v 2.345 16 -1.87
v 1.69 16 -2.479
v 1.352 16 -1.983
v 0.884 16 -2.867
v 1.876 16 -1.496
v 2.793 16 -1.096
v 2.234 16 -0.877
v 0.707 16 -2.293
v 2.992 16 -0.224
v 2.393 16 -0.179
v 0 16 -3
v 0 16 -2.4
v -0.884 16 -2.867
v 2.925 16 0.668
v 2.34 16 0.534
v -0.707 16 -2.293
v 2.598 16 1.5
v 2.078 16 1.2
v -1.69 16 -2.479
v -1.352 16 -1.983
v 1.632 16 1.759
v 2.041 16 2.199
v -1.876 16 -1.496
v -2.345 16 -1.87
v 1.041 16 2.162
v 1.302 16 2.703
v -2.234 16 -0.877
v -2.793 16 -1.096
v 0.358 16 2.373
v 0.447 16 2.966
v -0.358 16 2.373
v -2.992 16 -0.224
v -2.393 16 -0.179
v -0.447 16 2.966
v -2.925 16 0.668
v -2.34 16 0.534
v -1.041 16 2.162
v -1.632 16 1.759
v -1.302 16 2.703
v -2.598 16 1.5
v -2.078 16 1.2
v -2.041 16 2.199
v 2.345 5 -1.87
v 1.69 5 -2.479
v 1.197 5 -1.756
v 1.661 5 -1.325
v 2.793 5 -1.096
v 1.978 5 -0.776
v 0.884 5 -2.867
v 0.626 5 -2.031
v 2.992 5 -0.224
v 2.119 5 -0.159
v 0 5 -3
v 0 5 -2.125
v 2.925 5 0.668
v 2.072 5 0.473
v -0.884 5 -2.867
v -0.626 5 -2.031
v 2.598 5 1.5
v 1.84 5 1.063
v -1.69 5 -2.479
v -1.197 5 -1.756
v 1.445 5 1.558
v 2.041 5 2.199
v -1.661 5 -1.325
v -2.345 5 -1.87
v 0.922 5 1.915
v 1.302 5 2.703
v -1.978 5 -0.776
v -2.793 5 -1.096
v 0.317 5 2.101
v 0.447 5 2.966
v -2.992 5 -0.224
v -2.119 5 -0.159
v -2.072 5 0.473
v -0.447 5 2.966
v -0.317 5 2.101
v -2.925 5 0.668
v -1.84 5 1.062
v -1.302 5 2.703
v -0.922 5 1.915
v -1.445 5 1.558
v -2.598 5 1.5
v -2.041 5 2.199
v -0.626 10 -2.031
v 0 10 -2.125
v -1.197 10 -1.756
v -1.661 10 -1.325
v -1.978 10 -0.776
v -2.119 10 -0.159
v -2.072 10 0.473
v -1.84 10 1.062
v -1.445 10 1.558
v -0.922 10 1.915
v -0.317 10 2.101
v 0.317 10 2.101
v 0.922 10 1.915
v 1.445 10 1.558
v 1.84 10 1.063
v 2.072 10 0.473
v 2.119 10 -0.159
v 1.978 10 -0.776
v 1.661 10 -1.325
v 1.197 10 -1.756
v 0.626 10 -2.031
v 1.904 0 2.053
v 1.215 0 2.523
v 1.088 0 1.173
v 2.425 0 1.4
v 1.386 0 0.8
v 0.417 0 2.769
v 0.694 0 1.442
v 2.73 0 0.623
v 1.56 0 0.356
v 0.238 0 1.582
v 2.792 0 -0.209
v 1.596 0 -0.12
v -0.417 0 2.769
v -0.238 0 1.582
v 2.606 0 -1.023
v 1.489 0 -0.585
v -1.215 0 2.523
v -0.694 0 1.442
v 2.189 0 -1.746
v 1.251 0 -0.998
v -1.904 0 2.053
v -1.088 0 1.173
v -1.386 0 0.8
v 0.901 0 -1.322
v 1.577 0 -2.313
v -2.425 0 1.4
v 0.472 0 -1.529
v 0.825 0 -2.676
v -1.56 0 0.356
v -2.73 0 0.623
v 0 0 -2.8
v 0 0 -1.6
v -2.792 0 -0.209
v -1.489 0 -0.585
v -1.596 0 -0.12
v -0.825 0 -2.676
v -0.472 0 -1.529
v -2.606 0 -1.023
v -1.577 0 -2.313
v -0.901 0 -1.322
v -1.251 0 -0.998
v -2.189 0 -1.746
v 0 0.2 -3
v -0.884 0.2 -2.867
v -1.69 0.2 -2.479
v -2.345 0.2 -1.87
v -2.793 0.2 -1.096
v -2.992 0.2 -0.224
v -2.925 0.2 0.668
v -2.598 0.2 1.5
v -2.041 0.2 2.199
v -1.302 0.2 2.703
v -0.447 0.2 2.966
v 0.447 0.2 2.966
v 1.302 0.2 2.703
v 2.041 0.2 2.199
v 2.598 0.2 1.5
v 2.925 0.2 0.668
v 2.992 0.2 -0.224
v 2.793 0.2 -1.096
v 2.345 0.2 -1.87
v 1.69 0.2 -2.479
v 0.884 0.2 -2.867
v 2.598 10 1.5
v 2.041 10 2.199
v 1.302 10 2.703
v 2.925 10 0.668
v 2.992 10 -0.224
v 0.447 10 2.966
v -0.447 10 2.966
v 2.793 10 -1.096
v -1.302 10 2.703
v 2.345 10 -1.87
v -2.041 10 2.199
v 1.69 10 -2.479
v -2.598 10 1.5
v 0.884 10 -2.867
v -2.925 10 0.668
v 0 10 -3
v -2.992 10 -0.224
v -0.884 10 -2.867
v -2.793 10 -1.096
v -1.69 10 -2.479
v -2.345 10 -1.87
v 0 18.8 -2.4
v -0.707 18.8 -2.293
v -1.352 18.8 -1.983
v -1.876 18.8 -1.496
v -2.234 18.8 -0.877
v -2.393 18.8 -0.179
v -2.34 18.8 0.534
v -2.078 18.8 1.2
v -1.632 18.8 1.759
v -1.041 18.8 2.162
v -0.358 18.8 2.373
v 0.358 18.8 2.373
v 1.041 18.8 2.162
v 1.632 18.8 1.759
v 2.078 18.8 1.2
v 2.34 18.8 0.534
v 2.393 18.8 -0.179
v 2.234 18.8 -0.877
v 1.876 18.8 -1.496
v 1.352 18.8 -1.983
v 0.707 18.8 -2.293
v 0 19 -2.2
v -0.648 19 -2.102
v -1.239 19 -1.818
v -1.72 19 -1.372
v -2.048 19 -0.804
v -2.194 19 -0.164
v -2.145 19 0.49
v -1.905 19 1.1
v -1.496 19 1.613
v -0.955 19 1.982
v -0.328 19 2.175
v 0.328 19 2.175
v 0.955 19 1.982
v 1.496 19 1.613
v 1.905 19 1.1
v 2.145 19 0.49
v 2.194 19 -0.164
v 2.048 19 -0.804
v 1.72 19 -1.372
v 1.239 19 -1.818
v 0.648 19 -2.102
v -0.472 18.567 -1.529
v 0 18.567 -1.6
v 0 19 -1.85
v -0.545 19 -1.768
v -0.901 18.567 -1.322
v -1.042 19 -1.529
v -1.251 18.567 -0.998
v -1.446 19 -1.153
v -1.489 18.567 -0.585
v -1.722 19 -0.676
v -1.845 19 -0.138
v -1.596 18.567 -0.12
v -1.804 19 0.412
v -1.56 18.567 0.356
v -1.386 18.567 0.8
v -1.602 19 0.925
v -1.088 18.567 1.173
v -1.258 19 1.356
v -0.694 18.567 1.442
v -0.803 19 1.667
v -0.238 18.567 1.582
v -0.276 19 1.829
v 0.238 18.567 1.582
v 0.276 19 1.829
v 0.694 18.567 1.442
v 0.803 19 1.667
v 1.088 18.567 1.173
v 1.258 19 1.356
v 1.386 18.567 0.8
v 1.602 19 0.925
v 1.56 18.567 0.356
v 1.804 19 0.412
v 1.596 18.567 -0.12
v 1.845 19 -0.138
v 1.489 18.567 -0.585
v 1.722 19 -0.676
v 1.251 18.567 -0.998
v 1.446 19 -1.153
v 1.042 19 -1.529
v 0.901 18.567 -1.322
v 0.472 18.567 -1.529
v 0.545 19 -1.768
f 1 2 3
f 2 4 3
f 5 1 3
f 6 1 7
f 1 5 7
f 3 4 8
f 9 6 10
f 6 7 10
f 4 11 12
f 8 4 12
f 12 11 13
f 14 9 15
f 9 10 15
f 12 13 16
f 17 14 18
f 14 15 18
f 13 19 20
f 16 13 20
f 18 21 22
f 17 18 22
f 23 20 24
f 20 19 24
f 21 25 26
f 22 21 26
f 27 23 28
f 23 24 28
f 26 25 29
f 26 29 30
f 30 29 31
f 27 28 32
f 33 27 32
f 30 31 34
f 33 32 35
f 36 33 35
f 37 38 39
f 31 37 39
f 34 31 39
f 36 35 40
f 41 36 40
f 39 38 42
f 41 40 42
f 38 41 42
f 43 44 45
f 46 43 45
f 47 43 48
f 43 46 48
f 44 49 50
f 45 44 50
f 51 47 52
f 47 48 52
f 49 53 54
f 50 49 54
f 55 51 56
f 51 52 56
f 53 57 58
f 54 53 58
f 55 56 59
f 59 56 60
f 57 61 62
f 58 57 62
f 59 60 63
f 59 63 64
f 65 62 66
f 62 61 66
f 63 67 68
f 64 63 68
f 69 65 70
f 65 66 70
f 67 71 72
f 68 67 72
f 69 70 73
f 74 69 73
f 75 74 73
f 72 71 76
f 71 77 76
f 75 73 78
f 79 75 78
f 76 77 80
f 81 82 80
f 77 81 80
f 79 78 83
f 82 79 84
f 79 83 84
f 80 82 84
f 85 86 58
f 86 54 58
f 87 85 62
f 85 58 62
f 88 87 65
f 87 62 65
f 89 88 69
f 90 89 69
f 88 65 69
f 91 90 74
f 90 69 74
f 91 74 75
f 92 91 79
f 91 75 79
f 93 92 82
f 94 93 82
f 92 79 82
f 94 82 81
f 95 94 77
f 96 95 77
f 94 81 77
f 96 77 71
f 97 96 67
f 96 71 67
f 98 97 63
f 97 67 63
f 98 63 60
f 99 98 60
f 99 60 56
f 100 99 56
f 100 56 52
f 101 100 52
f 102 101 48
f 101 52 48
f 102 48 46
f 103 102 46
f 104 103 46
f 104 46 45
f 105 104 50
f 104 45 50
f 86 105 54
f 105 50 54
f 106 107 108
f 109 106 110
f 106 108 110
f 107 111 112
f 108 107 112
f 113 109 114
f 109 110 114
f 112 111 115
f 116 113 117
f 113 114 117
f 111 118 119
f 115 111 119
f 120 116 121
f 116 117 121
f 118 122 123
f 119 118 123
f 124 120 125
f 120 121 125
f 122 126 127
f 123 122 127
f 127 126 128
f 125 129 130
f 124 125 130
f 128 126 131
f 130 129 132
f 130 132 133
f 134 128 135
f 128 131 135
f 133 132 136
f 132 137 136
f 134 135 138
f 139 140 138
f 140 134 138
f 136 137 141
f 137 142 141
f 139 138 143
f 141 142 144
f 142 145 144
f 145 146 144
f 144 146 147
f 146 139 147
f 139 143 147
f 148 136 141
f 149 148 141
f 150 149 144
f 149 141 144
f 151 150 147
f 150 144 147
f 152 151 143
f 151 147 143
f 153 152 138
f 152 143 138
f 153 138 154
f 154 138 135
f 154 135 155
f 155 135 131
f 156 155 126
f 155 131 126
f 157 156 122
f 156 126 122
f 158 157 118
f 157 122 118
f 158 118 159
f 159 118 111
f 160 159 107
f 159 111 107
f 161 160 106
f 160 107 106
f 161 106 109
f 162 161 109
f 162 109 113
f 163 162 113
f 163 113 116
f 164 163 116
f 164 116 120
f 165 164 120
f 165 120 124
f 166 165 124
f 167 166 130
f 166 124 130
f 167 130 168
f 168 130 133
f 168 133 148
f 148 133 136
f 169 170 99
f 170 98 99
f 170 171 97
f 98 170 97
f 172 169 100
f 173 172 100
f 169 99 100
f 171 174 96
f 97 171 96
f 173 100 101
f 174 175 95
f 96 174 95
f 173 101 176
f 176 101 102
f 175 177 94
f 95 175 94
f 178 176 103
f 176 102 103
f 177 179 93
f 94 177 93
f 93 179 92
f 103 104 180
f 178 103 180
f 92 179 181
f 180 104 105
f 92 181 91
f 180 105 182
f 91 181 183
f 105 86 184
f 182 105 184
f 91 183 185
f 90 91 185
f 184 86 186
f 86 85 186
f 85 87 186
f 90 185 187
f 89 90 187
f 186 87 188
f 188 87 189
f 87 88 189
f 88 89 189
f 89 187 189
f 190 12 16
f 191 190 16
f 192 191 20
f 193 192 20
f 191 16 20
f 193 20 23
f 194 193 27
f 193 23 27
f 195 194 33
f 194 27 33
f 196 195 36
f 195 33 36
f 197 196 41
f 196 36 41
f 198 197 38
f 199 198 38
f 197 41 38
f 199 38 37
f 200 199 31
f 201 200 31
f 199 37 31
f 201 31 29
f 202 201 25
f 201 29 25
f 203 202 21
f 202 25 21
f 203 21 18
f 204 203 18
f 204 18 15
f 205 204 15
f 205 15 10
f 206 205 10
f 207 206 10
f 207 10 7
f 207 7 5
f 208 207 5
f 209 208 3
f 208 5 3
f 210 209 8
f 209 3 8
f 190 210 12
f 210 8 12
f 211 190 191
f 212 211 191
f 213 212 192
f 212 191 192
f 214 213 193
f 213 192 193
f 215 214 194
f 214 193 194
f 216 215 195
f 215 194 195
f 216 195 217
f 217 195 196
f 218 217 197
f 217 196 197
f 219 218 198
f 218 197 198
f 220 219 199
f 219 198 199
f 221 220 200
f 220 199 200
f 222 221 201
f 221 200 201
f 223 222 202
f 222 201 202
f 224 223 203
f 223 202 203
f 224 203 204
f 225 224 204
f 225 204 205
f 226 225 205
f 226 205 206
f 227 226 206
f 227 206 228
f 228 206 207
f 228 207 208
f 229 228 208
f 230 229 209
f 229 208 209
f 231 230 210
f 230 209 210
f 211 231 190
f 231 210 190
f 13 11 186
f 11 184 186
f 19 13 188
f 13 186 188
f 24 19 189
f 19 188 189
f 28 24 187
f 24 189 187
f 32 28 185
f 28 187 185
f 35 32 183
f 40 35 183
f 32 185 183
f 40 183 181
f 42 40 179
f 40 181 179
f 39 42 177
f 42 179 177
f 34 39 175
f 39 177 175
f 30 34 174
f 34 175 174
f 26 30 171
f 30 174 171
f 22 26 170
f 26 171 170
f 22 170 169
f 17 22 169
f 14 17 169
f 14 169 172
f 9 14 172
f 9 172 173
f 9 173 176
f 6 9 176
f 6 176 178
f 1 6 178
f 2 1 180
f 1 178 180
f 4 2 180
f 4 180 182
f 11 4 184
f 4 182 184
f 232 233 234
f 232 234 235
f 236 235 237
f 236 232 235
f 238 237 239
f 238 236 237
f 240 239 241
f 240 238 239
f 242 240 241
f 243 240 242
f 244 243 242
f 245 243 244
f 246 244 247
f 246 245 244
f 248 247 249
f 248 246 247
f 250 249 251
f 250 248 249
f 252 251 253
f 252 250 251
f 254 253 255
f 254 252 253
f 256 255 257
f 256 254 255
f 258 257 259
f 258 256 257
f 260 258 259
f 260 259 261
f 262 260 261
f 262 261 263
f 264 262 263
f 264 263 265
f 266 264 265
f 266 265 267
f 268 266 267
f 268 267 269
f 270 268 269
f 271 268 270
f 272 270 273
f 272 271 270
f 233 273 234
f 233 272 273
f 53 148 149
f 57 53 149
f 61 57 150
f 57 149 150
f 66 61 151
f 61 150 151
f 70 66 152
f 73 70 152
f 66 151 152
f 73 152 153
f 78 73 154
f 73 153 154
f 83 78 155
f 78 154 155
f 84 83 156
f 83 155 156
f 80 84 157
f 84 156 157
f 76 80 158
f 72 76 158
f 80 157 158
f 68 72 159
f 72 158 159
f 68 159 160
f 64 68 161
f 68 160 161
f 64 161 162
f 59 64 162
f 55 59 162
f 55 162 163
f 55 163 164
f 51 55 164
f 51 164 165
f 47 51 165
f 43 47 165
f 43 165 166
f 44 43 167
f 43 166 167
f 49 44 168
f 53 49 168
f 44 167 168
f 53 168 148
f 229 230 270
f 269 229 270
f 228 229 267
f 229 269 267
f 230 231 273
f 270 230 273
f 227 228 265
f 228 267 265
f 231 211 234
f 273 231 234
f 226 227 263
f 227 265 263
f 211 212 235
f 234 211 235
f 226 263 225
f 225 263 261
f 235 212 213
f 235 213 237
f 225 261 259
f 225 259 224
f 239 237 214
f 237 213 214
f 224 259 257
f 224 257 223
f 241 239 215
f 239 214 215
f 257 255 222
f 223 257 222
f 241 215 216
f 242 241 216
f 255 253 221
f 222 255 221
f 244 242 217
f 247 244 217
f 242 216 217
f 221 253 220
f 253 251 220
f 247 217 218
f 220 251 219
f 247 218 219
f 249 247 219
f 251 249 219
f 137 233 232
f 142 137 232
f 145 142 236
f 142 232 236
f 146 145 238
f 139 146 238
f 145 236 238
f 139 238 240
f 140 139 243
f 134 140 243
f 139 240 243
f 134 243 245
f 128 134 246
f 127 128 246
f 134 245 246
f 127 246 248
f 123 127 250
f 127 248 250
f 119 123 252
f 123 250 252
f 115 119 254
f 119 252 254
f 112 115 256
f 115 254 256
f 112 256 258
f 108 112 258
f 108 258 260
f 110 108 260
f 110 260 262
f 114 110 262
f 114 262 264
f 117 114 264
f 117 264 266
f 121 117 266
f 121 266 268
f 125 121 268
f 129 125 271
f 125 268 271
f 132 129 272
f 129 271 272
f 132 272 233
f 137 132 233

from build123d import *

# Parameters (mm, degrees)
CHAFL_N4_SIZE  = 0.2
CHAFL_N5_SIZE  = 0.25
CHAFL_N5_SIZE2 = 0.433012702


with BuildPart() as part:
    # Croquis3 → Revolución1 (revolve)
    with BuildSketch(Plane.XY, mode=Mode.PRIVATE) as revoluci_n1_sk:
        Polygon((-1.6, 0), (-1.6, 19), (-2.4, 19), (-2.4, 16), (-3, 16), (-3, 10), (-2.125, 10), (-2.125, 5), (-3, 5), (-3, 0), align=None)
    revolve(revoluci_n1_sk.sketch.rotate(Axis((0, 0, 0), (0, 1, 0)), 270), axis=Axis((0, 0, 0), (0, 1, 0)))

    # Chaflán4
    chafl_n4_edges = [part.edges().sort_by_distance(p)[0] for p in [
        (0, 19, 2.4),
        (0, 0, 3),
    ]]
    chamfer(chafl_n4_edges, length=CHAFL_N4_SIZE)

    # Chaflán5
    chafl_n5_edges = [part.edges().sort_by_distance(p)[0] for p in [
        (0, 19, 1.6),
    ]]
    chafl_n5_side = [part.faces().sort_by_distance(p)[0] for p in [
        (0, 19, 2.137774603),
    ]]
    chamfer(chafl_n5_edges, length=CHAFL_N5_SIZE, length2=CHAFL_N5_SIZE2, reference=chafl_n5_side[0])


solid = part.part
